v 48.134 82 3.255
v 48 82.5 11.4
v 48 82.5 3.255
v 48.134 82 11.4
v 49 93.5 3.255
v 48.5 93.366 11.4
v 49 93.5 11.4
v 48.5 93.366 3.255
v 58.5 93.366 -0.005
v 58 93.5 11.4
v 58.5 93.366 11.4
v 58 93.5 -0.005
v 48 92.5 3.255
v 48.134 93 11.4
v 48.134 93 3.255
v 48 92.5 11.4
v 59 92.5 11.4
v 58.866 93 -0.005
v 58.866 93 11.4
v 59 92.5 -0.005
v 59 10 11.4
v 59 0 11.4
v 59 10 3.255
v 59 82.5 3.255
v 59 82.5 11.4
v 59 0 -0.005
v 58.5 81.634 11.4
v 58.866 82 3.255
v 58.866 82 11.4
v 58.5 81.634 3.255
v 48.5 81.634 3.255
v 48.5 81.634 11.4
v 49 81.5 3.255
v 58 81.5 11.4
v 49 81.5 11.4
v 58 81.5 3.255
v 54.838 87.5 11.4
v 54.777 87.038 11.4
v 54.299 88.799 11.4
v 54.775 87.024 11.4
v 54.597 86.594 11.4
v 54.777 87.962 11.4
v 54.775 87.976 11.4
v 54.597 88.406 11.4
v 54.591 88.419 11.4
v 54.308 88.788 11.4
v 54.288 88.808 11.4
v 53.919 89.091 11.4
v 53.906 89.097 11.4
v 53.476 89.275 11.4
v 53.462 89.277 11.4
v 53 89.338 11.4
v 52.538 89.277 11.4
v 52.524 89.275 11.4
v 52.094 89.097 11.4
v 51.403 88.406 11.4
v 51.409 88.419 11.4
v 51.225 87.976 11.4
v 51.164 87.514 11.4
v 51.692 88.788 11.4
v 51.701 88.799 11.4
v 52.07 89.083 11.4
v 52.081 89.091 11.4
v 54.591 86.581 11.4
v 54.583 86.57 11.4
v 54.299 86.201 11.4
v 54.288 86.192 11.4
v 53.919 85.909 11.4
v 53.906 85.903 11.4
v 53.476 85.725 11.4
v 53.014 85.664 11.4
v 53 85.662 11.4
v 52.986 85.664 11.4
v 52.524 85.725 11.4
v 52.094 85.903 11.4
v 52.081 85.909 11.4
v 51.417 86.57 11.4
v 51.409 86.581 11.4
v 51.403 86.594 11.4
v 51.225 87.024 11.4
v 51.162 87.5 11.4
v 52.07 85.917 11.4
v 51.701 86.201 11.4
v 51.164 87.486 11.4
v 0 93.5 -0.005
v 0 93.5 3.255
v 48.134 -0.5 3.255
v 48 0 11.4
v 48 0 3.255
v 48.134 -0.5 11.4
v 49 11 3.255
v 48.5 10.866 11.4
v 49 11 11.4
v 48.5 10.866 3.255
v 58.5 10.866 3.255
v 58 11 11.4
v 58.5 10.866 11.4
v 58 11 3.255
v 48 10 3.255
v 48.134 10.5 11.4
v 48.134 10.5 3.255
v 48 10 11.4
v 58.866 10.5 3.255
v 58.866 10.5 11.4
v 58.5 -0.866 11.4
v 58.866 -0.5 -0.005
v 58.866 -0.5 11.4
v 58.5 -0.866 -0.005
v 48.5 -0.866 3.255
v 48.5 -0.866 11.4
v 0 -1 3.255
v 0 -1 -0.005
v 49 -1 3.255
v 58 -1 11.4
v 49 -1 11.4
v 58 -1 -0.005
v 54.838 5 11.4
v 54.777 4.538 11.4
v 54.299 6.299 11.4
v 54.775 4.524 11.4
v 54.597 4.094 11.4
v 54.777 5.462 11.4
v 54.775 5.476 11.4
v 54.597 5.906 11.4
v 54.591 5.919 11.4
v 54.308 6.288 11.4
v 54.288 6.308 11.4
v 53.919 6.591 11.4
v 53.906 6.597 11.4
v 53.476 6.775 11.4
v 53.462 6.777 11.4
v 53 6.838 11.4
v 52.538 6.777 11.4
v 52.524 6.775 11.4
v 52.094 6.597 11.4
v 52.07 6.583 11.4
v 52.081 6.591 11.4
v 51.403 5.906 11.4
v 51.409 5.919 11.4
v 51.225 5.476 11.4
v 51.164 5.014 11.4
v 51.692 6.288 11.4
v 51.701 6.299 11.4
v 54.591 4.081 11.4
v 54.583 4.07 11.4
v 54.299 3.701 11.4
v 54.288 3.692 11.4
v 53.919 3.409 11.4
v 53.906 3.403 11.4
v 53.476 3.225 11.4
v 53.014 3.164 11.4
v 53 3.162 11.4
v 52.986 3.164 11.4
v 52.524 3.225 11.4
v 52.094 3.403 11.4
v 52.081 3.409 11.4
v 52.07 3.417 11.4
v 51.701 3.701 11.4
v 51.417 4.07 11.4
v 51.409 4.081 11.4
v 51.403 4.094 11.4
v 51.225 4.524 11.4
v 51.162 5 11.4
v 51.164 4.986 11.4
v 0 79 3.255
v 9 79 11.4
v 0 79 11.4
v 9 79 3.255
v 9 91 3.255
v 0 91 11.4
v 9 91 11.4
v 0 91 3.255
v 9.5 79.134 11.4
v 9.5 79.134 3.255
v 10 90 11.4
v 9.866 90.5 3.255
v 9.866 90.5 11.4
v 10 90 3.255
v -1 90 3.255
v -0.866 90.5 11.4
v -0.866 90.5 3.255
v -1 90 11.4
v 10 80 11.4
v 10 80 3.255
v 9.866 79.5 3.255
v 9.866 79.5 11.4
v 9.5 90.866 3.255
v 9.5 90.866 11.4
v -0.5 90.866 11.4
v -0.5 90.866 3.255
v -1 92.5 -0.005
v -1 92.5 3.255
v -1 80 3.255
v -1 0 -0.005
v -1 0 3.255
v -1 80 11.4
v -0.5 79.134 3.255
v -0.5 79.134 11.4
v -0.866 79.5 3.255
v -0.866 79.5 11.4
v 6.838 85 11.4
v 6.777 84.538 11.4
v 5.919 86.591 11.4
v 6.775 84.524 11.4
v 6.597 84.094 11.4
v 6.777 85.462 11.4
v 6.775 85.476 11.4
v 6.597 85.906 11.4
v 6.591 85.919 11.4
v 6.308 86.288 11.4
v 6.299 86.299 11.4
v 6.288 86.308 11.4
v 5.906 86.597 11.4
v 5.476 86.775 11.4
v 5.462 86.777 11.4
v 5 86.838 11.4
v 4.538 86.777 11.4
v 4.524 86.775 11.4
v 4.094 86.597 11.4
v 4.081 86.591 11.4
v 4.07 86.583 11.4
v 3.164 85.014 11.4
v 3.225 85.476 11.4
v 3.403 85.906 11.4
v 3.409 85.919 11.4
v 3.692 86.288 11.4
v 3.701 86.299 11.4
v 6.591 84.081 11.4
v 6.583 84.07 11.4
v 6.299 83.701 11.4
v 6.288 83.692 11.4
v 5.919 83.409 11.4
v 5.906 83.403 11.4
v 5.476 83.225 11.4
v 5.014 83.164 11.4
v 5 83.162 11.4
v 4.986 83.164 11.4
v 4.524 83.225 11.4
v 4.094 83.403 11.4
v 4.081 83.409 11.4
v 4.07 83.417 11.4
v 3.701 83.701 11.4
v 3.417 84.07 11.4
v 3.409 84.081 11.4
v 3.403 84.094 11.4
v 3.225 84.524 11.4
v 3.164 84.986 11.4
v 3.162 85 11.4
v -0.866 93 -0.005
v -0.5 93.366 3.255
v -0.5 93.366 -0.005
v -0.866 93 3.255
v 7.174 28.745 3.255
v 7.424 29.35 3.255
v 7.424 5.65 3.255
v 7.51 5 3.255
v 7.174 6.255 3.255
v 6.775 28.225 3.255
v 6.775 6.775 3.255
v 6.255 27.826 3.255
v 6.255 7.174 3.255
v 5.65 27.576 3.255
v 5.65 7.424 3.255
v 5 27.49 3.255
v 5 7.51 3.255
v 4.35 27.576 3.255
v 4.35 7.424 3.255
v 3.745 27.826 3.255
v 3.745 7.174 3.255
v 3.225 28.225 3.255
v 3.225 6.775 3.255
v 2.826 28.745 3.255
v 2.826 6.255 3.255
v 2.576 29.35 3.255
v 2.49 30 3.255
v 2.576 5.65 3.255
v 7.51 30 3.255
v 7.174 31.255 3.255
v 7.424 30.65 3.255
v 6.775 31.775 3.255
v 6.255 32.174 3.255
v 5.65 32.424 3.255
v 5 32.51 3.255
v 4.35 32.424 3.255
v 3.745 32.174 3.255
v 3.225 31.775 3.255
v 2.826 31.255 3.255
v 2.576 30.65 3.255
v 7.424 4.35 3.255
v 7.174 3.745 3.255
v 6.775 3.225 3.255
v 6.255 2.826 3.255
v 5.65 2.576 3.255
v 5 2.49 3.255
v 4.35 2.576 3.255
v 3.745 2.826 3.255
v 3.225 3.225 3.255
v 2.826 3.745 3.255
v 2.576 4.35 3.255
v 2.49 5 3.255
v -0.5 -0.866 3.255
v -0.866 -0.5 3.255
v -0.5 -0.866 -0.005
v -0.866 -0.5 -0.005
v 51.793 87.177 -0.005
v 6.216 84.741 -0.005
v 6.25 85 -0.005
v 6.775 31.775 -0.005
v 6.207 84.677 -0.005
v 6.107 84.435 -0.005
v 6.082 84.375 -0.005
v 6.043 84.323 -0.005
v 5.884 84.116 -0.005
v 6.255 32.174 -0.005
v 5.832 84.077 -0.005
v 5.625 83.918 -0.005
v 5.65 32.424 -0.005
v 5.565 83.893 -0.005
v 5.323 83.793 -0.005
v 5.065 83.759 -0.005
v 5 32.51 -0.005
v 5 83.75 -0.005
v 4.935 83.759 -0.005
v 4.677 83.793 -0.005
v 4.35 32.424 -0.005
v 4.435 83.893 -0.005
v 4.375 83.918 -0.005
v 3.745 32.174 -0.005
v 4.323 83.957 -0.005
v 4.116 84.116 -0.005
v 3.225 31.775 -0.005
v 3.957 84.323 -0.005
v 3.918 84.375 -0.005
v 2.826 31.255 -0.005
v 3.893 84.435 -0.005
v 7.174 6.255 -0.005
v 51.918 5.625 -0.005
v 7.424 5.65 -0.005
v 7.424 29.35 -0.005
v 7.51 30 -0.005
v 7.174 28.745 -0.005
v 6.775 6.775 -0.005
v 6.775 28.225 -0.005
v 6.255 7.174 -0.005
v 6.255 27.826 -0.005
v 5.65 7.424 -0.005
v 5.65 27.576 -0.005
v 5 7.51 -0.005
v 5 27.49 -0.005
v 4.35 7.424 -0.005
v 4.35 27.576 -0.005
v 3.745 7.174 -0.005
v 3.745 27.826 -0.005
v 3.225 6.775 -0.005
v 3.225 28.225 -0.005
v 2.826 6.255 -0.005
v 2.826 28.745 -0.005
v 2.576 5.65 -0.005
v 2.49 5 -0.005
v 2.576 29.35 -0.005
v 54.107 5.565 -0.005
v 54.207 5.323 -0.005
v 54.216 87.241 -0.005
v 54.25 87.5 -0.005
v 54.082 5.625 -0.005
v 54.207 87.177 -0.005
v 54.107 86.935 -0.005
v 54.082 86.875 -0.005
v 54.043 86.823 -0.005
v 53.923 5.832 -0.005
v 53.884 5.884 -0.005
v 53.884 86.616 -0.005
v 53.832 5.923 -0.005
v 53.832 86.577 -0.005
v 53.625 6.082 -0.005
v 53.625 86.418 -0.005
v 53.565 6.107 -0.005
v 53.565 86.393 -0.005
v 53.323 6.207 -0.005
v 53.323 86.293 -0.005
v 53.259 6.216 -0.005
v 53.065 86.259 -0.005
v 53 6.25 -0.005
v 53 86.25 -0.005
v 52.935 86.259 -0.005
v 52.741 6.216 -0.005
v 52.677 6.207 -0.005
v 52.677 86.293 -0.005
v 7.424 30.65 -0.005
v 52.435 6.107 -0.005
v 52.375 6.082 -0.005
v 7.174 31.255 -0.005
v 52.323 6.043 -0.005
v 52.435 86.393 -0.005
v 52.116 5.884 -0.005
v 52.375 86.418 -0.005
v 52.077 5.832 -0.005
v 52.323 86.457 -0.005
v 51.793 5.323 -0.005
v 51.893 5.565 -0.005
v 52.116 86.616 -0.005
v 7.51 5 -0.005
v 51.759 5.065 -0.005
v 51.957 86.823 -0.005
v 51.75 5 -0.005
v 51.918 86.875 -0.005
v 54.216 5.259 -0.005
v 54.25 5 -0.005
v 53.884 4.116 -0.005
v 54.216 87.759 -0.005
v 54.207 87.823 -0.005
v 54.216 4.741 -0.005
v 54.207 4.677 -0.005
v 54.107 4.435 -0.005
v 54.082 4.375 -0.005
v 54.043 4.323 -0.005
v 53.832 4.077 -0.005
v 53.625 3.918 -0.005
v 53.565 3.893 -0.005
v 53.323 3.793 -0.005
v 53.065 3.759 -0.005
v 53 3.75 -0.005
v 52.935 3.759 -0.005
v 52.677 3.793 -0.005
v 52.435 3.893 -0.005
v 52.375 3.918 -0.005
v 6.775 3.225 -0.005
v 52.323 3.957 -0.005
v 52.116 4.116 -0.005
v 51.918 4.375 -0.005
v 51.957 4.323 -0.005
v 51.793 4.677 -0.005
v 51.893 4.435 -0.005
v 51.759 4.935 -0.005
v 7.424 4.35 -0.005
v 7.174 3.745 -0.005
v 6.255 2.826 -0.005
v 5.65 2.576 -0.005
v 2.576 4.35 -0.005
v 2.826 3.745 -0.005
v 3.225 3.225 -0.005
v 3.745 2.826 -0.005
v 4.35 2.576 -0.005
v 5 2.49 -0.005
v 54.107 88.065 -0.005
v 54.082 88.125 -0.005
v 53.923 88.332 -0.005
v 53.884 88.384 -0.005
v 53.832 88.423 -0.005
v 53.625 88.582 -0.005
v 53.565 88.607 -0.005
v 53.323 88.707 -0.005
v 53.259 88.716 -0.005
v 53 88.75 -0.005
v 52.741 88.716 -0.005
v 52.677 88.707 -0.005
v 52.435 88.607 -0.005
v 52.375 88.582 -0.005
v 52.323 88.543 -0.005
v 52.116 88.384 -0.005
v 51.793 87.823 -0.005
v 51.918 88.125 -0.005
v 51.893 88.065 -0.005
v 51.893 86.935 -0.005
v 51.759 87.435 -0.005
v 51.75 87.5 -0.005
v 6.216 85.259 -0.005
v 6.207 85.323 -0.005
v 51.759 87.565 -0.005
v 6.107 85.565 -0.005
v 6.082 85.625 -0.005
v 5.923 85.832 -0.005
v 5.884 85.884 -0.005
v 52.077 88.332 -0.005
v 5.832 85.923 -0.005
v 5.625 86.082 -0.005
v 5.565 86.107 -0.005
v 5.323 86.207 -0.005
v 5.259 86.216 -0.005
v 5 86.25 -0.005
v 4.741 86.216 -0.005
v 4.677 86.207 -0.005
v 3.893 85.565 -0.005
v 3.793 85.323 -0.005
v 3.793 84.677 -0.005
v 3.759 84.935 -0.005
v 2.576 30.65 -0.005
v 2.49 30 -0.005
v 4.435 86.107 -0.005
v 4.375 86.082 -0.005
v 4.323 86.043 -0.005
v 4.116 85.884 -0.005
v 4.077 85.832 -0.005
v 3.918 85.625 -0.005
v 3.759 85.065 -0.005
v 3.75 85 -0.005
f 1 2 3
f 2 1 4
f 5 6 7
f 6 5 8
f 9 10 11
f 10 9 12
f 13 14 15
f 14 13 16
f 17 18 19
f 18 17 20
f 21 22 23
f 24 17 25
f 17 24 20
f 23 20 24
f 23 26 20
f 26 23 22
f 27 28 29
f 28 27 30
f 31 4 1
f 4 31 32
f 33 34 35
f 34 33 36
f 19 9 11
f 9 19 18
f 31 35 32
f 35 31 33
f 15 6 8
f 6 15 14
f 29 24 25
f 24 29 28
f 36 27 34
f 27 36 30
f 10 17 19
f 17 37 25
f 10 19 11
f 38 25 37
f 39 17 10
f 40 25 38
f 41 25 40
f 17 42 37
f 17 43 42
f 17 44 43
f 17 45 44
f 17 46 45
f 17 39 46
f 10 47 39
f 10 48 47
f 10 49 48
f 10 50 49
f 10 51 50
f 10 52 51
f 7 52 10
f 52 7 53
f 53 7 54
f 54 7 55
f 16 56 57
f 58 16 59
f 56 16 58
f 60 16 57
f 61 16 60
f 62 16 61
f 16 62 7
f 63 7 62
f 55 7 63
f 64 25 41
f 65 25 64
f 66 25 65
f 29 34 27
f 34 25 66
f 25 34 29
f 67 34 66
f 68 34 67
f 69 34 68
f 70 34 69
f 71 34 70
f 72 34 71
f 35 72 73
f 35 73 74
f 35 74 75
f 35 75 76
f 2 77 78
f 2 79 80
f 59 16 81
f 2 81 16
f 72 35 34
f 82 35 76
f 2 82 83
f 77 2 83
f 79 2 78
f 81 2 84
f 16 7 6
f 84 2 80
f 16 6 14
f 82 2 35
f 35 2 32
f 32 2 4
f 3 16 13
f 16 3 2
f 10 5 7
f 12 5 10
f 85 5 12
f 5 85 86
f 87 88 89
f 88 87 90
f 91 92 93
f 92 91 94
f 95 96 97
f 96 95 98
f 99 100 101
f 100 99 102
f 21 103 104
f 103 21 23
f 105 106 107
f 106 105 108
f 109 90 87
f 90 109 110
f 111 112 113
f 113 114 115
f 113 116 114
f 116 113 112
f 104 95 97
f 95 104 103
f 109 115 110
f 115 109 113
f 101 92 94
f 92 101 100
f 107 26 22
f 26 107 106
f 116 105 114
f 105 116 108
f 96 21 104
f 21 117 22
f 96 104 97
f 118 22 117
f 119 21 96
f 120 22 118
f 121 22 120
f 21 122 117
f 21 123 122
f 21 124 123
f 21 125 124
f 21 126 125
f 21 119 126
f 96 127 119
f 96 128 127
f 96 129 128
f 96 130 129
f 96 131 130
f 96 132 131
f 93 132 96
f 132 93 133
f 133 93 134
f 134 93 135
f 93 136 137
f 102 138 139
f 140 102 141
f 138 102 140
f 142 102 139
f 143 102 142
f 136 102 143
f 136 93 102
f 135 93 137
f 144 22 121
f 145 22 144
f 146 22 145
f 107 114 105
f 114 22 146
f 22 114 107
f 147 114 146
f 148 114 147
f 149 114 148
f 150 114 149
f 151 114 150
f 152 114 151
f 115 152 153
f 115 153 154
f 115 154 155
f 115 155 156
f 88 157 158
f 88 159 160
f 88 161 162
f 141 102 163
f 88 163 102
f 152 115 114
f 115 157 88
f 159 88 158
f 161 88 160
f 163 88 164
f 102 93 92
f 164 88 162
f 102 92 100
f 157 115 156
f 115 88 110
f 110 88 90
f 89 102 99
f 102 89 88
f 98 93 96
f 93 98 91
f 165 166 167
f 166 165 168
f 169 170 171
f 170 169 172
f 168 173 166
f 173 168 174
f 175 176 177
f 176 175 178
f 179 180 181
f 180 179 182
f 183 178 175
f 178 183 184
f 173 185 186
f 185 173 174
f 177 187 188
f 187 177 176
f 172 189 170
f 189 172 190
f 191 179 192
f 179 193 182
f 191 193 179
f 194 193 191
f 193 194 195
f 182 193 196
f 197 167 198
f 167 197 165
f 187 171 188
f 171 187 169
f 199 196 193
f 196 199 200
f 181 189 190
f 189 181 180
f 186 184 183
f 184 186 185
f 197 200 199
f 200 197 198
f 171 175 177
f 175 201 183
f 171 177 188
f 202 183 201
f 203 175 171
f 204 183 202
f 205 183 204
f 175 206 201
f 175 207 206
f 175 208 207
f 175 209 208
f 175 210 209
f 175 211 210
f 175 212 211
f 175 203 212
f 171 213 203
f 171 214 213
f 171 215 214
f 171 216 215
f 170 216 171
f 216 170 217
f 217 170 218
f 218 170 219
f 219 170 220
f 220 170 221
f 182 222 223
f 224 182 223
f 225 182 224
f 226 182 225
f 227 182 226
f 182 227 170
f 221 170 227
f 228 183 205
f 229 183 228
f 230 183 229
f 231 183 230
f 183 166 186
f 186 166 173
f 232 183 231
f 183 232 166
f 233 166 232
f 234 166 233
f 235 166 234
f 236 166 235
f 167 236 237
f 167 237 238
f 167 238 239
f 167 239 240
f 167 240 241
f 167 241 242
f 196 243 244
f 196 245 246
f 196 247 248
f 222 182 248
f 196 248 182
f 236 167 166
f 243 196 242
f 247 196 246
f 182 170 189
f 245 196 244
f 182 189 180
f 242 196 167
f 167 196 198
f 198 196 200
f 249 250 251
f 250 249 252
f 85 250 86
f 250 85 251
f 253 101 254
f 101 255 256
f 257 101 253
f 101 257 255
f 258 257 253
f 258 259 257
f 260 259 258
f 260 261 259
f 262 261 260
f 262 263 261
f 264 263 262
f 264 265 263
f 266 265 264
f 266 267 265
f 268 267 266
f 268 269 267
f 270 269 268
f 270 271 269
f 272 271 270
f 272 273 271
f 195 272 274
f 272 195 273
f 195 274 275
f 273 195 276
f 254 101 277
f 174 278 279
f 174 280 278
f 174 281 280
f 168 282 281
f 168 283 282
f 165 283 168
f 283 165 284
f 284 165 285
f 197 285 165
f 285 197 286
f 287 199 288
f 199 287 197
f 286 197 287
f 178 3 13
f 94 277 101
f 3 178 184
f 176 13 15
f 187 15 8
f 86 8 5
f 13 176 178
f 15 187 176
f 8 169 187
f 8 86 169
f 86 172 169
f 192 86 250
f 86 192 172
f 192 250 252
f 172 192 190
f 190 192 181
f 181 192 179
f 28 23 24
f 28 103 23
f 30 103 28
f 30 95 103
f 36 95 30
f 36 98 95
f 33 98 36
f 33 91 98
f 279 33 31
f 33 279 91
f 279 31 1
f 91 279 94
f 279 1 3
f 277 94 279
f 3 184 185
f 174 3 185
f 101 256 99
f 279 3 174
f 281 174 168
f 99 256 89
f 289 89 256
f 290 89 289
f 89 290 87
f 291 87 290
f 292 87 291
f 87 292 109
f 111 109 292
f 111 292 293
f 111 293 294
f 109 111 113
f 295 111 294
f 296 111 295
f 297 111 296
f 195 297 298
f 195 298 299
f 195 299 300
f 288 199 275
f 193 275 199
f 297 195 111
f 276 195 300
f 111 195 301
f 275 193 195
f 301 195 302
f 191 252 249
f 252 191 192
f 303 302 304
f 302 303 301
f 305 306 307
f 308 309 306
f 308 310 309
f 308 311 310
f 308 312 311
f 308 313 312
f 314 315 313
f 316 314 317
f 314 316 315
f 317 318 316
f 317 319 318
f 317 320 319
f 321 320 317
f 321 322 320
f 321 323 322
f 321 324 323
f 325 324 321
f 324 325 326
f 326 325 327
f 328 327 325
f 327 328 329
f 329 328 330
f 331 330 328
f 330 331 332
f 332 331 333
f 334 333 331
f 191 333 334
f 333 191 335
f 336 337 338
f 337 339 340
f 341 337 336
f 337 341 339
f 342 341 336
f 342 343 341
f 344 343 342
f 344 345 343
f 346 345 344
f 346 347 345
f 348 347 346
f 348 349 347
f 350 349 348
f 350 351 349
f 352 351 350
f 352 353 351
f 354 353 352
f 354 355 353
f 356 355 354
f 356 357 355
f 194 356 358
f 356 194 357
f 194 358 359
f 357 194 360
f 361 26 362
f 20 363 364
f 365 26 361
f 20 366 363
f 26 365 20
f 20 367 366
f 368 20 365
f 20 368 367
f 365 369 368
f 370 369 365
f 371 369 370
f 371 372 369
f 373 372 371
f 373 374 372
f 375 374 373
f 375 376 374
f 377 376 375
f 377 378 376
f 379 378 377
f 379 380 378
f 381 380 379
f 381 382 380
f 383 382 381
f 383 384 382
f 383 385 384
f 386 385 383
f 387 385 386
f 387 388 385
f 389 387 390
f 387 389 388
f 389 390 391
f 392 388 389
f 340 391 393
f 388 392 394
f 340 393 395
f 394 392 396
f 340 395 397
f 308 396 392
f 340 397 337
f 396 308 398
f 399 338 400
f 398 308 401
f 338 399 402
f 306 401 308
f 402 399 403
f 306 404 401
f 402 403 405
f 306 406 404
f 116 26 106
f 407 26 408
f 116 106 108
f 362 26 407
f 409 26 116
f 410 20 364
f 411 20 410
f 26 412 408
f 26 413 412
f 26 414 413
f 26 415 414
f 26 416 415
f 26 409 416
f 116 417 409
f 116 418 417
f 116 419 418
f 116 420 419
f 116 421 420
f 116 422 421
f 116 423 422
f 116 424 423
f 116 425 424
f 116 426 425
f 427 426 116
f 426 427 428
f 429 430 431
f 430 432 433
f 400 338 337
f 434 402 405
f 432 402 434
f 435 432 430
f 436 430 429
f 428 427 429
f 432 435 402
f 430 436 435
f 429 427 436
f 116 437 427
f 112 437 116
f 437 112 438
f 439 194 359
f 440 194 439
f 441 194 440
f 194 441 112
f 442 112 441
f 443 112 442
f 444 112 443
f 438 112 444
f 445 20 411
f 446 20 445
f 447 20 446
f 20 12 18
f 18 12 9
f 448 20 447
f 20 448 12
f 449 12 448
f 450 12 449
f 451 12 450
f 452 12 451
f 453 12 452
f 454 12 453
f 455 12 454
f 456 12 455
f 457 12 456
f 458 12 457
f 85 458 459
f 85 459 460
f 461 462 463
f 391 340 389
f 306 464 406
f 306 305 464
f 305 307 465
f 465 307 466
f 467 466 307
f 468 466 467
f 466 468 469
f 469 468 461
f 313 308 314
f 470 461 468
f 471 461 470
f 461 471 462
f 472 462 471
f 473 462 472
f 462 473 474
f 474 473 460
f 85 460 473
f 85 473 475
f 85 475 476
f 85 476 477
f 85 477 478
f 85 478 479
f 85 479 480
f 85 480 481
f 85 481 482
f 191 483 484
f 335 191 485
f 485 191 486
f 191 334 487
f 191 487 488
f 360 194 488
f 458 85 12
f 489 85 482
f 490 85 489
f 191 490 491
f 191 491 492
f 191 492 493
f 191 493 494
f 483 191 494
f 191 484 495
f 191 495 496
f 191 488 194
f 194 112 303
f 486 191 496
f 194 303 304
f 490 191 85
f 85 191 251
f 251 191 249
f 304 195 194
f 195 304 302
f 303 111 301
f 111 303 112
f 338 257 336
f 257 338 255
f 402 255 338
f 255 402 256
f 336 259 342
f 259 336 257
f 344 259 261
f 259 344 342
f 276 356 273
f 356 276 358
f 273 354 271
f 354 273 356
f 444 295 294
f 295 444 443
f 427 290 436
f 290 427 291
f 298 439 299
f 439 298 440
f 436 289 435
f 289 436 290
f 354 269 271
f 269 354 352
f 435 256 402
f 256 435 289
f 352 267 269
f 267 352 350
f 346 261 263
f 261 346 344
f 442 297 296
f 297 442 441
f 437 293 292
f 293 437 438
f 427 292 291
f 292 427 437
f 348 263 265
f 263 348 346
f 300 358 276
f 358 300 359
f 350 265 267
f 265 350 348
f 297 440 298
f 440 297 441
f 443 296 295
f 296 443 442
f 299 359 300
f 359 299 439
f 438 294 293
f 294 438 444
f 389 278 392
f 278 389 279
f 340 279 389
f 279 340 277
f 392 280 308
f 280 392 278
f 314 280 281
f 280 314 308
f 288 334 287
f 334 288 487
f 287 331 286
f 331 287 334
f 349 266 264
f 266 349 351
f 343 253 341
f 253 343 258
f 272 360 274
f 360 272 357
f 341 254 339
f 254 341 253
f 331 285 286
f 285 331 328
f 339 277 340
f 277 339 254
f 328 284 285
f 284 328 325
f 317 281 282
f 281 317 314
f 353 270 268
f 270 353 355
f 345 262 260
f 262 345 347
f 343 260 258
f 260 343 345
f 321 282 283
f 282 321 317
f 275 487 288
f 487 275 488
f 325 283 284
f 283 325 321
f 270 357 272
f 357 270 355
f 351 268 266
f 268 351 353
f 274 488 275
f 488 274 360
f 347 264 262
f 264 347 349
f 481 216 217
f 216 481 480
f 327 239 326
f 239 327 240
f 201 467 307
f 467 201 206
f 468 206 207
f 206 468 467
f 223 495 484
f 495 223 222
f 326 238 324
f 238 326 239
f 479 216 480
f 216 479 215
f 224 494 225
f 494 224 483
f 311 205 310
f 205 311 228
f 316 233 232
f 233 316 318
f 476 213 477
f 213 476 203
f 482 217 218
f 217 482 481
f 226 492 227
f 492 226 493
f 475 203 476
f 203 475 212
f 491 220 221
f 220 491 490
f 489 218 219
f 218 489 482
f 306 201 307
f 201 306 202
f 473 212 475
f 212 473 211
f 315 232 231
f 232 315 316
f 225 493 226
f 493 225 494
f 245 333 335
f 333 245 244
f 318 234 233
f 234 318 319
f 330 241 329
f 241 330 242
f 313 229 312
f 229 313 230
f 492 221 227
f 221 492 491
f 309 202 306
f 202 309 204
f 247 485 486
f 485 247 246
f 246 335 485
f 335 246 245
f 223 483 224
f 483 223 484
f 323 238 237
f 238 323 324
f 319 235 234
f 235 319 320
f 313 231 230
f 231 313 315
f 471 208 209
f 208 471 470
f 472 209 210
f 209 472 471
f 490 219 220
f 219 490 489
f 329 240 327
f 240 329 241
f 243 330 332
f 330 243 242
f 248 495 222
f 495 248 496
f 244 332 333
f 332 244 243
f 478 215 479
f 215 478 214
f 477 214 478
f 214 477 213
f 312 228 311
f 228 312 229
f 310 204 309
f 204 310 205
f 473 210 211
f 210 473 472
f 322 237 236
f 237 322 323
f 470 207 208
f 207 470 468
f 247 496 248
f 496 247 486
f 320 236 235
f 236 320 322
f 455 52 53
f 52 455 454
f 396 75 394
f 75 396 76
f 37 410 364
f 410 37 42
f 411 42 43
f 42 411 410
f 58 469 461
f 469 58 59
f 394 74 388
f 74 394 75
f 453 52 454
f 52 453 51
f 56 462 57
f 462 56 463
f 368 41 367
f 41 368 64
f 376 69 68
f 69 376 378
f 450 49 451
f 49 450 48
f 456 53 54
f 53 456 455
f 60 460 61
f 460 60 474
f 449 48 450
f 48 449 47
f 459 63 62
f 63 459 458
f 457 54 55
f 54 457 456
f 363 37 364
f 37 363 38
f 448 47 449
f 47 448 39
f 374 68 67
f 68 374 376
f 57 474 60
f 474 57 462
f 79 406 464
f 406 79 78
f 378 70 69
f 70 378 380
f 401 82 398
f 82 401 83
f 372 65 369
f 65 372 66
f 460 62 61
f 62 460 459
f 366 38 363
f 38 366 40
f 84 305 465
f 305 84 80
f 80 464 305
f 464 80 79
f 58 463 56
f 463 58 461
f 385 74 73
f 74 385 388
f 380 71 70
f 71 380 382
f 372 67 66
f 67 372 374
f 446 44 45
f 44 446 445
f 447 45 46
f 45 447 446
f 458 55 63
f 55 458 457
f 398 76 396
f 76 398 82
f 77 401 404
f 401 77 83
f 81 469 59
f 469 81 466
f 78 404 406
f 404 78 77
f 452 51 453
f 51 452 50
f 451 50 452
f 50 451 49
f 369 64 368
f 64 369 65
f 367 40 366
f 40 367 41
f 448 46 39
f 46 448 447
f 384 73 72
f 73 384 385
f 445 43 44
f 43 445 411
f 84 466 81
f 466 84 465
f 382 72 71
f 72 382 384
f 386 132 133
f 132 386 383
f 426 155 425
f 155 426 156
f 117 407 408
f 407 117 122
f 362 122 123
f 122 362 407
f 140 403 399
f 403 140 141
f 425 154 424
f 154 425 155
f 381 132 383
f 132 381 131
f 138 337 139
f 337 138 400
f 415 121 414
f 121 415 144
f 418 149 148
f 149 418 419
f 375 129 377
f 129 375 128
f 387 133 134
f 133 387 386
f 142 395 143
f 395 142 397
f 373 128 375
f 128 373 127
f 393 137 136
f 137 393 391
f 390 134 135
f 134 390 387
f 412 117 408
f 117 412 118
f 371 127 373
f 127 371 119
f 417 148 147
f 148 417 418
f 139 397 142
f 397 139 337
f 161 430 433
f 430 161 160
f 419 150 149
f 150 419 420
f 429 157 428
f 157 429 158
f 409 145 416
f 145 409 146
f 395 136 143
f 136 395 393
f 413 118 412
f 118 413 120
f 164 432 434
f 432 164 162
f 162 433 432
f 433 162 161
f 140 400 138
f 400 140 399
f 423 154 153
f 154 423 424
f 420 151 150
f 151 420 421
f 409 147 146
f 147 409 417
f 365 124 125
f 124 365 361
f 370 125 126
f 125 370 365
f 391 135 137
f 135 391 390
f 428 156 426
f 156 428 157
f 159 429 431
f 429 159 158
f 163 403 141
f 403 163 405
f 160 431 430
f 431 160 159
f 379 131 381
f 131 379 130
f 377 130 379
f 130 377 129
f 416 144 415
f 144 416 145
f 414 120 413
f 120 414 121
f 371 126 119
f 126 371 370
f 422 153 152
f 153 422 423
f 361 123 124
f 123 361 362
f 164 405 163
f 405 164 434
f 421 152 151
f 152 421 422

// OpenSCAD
width = 58;	
height = 92.5;	
depth = 3.25;
wall_thickness = 5;
pcb_z_offset = 8;
slot_dist_from_edge = 5;
pcb_pad_width = 9;
pcb_pad_height = 9;
clip = false;		// false for t-slot holes
clip_width = 23.7;
clip_height = 6.5;

term_mnt_ramps14(width, height, depth, wall_thickness, pcb_z_offset, slot_dist_from_edge, 
	pcb_pad_width, pcb_pad_height, clip, clip_width, clip_height);

module term_mnt_ramps14(w, h, d, wt, pcbz, sdfe, ppw, pph, c, cw, ch) {
difference() {
  union() {
	// pcb mount pads
    minkowski() {
      union() {
    translate([w - 9, 0, d]) cube([9, 10, pcbz + 0.1]);
    translate([0, h - 12.5, d]) cube([9, 10, pcbz + 0.1]);
    translate([w - 9, h - 10, d]) cube([9, 10, pcbz + 0.1]);
    }
    translate([0, 0, 0]) cylinder(r = 1, h = 0.1, center = true, $fn = 12);
  }
	// base support
    minkowski() { 
      union() {
        translate([0, 0, 0]) cube([w, h, d]);
    }
    translate([0, 0, 0]) cylinder(r = 1, h = 0.01, center = true, $fn = 12);
  }
}
  if (c) {
    // extrusion clip mount hole
    translate([w / 2 - 20 / 2, sdfe, -0.01]) cube([cw, ch, d + 3]);
    // extrusion clip mount hole 2
    translate([sdfe, h / 2 - 10 / 2, -0.01]) cube([ch, cw, d + 3]);
  } else {
    for(y = [sdfe, sdfe * 6]) {
    // M5 mount screw hole
    translate([sdfe, y, 0]) cylinder(r = 2.51, h = d * 2 + 0.1, center = true, $fn = 24);
    // M5 mount countersink
    translate([sdfe, y, 6.5]) cylinder(r = 3.6, h = d + 0.1, center = true, $fn = 24);
    }
  }
    // pcb mount hls
    translate([5, 85, 0]) cylinder(r1 = 0.5, r2 = 2, h = d * 4 + pcbz * 2 + 0.1, center = true, $fn = 24);
    translate([53, 87.5, 0]) cylinder(r1 = 0.5, r2 = 2, h = d * 4 + pcbz * 2 + 0.1, center = true, $fn = 24);
    translate([53, 5, 0]) cylinder(r1 = 0.5, r2 = 2, h = d * 4+ pcbz * 2 + 0.1, center = true, $fn = 24);
}
}
